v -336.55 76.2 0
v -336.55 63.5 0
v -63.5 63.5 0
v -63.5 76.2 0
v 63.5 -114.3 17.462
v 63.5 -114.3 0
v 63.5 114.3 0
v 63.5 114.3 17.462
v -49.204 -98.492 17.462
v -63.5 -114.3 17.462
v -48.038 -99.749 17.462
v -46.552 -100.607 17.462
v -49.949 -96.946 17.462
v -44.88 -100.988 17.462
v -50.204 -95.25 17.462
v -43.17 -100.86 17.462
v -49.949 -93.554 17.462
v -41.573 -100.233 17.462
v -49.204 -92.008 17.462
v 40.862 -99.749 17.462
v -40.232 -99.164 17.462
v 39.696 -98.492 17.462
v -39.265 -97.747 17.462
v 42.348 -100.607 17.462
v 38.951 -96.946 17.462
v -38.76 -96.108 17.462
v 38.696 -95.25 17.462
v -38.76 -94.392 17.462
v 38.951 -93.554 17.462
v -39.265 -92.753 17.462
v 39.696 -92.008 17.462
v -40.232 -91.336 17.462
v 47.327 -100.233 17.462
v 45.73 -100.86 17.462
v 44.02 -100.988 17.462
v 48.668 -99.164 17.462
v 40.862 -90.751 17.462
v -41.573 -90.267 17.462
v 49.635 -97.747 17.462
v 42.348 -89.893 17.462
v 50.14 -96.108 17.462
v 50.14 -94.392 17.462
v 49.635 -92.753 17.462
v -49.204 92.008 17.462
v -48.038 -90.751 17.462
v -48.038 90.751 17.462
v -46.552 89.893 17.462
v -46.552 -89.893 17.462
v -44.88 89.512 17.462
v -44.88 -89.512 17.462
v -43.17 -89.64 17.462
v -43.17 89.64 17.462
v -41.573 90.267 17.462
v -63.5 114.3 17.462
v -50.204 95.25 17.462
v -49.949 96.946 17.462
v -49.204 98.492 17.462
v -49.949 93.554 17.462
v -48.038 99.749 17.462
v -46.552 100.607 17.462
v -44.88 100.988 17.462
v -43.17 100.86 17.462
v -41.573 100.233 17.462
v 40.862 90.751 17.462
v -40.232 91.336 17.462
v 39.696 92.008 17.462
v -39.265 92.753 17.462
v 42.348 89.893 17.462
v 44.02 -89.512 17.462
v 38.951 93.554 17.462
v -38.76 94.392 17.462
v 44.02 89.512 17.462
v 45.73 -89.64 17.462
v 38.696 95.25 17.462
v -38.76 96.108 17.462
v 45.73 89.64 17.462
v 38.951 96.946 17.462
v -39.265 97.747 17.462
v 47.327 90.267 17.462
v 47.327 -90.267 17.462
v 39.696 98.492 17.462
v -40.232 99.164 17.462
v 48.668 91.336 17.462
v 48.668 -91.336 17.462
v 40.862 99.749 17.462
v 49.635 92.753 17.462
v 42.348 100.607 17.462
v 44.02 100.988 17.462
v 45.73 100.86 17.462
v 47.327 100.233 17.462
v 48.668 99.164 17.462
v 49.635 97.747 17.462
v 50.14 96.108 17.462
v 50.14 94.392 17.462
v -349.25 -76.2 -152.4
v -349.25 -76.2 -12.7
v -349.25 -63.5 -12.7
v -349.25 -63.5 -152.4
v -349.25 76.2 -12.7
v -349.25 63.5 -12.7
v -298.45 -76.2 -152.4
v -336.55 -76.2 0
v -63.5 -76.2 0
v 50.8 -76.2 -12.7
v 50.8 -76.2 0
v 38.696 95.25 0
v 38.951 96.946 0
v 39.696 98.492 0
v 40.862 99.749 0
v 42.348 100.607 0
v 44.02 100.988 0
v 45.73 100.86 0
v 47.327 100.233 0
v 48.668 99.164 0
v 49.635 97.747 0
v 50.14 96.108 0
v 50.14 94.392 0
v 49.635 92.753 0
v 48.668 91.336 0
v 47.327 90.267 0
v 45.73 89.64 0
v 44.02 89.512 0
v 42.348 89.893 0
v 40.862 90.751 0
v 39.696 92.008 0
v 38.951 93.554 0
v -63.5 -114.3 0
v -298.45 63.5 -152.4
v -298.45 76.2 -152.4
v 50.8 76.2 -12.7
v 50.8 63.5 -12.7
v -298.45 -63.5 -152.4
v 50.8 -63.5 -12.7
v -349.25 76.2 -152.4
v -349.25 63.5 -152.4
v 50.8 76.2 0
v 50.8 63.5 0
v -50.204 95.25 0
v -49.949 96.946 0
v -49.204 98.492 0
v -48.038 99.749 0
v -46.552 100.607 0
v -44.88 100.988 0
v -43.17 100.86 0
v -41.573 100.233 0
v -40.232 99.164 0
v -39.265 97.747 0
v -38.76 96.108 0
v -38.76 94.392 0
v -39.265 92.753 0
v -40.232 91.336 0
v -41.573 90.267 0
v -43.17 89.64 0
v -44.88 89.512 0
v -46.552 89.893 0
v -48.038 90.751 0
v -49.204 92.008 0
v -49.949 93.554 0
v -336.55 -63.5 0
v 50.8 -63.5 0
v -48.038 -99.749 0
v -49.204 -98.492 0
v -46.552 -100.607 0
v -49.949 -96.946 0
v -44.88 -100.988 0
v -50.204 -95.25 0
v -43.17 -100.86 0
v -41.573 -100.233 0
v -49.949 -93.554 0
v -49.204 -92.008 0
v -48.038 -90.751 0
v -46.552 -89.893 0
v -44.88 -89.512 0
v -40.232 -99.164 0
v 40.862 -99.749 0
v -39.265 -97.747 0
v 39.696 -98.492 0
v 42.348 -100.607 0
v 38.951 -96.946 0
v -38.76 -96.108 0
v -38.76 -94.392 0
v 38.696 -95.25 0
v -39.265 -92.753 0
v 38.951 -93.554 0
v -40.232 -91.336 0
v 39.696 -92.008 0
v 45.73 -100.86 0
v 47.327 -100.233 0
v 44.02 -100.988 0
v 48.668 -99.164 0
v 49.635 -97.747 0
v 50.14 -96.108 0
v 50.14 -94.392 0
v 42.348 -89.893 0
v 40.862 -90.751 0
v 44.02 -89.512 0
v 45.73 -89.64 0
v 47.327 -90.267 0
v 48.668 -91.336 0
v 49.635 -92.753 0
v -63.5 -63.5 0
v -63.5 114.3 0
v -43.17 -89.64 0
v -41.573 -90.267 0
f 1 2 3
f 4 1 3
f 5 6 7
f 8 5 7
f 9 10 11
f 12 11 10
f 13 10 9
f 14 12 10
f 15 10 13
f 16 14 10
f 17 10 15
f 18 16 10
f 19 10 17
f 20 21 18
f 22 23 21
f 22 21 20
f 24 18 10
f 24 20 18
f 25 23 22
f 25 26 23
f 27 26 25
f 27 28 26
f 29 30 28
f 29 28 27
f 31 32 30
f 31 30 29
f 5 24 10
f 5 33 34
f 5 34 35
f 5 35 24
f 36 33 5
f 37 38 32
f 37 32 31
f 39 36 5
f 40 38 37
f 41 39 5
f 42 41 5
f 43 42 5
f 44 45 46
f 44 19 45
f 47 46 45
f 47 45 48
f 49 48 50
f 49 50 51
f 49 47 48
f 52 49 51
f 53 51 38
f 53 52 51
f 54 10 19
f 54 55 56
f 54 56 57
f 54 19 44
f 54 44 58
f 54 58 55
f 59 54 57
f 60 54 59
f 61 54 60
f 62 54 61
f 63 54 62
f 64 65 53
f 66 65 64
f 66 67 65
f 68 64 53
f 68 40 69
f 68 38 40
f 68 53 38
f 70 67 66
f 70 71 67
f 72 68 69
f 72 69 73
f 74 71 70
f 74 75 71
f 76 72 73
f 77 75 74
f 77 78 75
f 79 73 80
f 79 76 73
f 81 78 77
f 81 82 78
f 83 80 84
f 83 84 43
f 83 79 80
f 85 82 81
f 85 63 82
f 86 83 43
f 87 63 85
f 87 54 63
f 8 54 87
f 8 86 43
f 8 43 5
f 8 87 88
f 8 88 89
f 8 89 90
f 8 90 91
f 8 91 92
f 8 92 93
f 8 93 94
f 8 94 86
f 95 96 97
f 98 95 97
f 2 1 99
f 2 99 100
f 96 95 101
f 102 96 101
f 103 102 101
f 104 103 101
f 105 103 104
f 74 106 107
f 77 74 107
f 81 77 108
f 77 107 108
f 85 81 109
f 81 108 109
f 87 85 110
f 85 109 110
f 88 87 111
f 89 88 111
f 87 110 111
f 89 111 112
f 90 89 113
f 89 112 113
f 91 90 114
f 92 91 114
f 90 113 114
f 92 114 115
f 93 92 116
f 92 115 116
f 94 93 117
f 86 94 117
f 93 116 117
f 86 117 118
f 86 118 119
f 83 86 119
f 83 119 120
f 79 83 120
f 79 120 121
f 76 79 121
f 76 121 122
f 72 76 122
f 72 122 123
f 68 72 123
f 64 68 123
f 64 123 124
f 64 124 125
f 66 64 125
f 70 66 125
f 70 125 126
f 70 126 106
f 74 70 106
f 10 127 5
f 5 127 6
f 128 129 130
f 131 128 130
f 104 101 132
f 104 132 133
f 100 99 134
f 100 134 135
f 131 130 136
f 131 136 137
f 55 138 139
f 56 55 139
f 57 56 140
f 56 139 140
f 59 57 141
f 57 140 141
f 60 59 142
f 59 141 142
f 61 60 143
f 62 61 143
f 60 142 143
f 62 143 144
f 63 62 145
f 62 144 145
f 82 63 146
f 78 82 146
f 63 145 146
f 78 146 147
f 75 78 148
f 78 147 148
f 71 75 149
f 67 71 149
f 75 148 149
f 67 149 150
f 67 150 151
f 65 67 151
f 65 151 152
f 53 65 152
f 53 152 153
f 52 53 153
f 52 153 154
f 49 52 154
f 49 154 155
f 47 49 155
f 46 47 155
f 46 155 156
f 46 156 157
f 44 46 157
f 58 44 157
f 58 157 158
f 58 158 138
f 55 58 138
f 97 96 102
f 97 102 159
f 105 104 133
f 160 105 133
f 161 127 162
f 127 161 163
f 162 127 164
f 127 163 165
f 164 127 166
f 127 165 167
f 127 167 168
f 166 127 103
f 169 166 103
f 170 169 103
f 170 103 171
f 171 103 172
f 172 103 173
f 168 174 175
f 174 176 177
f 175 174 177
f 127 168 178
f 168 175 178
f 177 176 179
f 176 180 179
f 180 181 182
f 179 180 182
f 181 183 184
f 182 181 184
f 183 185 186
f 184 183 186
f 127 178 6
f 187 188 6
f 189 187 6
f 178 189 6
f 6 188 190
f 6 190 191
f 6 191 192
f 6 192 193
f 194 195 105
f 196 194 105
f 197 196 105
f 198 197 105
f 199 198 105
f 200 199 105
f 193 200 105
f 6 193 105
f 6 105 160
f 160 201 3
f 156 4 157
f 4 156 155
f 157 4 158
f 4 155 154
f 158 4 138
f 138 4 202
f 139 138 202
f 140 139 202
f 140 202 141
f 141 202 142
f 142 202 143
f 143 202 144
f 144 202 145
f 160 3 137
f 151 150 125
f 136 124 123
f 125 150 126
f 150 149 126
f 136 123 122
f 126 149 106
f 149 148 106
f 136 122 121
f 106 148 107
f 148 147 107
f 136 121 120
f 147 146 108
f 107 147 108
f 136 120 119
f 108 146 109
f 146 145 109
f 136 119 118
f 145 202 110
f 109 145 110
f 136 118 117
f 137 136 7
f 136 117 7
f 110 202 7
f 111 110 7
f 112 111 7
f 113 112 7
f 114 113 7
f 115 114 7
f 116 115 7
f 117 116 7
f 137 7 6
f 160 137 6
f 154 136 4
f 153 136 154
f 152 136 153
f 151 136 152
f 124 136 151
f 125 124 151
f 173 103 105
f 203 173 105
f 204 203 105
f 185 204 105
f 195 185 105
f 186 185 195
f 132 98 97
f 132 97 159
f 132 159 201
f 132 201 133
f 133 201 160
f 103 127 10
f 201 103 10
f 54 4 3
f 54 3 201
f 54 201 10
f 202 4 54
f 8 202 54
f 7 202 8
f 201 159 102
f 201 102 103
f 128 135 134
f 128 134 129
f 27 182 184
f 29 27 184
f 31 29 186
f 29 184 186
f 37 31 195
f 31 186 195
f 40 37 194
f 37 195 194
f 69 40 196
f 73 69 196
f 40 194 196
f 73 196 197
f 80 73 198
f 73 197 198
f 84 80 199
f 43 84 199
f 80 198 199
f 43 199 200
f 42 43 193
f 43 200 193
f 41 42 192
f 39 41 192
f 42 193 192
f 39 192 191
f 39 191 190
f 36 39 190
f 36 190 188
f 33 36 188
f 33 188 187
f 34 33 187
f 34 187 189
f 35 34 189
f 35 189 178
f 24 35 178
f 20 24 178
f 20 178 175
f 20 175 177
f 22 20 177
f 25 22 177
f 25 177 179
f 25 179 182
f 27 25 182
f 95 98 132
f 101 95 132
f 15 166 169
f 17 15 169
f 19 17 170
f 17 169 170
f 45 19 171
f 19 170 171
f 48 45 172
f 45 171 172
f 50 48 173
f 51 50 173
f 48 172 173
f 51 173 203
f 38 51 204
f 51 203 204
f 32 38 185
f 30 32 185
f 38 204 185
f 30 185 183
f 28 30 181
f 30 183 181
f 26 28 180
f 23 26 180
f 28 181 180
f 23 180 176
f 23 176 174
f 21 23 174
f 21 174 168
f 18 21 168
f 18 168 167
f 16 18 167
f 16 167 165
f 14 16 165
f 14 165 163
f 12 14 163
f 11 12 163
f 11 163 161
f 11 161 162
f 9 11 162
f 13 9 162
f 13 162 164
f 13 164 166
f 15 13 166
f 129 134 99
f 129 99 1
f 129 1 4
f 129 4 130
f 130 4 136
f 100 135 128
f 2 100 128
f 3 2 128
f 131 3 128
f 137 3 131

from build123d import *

# Parameters (mm, degrees)
F0_W     = 127
F0_H     = 228.6
F1_DEPTH = 17.4625
F3_D     = 11.50874
F4_W     = 400.05
F4_H     = 12.7
F5_DEPTH = 152.4
F7_DEPTH = 190.501
F8_SIZE  = 12.7


with BuildPart() as f1:
    # F0 (on Top) → F1 (new body)
    with BuildSketch(Plane.XY):
        Rectangle(F0_W, F0_H)
    extrude(amount=F1_DEPTH)

    # F3 (through all)
    with Locations(Plane.XY.offset(17.4625)):
        with Locations((-44.45, 95.25), (44.45, 95.25), (44.45, -95.25), (-44.45, -95.25)):
            Hole(F3_D / 2)

    # F4 (on face) → F5 (join)
    with BuildSketch(Plane(origin=(0, 0, 0), x_dir=(1, 0, 0), z_dir=(0, 0, -1))):
        with Locations((-149.225, -69.85)):
            Rectangle(F4_W, F4_H)
    extrude(amount=F5_DEPTH)

    # F6 (on face) → F7 (cut, through all)
    with BuildSketch(Plane(origin=(0, 76.2, 0), x_dir=(-1, 0, 0), z_dir=(0, 1, 0))):
        Polygon((-50.8, -12.7), (-50.8, -152.4), (298.45, -152.4), align=None)
    extrude(amount=-F7_DEPTH, mode=Mode.SUBTRACT)

    # F8
    f8_edges = [f1.edges().sort_by_distance(p)[0] for p in [
        (-349.25, 69.85, 0),
    ]]
    chamfer(f8_edges, length=F8_SIZE)

    # F9: F1 across plane


with BuildPart() as f1_1:
    add(f1.part)
    add(f1.part.mirror(Plane.XZ))


solid = f1_1.part
